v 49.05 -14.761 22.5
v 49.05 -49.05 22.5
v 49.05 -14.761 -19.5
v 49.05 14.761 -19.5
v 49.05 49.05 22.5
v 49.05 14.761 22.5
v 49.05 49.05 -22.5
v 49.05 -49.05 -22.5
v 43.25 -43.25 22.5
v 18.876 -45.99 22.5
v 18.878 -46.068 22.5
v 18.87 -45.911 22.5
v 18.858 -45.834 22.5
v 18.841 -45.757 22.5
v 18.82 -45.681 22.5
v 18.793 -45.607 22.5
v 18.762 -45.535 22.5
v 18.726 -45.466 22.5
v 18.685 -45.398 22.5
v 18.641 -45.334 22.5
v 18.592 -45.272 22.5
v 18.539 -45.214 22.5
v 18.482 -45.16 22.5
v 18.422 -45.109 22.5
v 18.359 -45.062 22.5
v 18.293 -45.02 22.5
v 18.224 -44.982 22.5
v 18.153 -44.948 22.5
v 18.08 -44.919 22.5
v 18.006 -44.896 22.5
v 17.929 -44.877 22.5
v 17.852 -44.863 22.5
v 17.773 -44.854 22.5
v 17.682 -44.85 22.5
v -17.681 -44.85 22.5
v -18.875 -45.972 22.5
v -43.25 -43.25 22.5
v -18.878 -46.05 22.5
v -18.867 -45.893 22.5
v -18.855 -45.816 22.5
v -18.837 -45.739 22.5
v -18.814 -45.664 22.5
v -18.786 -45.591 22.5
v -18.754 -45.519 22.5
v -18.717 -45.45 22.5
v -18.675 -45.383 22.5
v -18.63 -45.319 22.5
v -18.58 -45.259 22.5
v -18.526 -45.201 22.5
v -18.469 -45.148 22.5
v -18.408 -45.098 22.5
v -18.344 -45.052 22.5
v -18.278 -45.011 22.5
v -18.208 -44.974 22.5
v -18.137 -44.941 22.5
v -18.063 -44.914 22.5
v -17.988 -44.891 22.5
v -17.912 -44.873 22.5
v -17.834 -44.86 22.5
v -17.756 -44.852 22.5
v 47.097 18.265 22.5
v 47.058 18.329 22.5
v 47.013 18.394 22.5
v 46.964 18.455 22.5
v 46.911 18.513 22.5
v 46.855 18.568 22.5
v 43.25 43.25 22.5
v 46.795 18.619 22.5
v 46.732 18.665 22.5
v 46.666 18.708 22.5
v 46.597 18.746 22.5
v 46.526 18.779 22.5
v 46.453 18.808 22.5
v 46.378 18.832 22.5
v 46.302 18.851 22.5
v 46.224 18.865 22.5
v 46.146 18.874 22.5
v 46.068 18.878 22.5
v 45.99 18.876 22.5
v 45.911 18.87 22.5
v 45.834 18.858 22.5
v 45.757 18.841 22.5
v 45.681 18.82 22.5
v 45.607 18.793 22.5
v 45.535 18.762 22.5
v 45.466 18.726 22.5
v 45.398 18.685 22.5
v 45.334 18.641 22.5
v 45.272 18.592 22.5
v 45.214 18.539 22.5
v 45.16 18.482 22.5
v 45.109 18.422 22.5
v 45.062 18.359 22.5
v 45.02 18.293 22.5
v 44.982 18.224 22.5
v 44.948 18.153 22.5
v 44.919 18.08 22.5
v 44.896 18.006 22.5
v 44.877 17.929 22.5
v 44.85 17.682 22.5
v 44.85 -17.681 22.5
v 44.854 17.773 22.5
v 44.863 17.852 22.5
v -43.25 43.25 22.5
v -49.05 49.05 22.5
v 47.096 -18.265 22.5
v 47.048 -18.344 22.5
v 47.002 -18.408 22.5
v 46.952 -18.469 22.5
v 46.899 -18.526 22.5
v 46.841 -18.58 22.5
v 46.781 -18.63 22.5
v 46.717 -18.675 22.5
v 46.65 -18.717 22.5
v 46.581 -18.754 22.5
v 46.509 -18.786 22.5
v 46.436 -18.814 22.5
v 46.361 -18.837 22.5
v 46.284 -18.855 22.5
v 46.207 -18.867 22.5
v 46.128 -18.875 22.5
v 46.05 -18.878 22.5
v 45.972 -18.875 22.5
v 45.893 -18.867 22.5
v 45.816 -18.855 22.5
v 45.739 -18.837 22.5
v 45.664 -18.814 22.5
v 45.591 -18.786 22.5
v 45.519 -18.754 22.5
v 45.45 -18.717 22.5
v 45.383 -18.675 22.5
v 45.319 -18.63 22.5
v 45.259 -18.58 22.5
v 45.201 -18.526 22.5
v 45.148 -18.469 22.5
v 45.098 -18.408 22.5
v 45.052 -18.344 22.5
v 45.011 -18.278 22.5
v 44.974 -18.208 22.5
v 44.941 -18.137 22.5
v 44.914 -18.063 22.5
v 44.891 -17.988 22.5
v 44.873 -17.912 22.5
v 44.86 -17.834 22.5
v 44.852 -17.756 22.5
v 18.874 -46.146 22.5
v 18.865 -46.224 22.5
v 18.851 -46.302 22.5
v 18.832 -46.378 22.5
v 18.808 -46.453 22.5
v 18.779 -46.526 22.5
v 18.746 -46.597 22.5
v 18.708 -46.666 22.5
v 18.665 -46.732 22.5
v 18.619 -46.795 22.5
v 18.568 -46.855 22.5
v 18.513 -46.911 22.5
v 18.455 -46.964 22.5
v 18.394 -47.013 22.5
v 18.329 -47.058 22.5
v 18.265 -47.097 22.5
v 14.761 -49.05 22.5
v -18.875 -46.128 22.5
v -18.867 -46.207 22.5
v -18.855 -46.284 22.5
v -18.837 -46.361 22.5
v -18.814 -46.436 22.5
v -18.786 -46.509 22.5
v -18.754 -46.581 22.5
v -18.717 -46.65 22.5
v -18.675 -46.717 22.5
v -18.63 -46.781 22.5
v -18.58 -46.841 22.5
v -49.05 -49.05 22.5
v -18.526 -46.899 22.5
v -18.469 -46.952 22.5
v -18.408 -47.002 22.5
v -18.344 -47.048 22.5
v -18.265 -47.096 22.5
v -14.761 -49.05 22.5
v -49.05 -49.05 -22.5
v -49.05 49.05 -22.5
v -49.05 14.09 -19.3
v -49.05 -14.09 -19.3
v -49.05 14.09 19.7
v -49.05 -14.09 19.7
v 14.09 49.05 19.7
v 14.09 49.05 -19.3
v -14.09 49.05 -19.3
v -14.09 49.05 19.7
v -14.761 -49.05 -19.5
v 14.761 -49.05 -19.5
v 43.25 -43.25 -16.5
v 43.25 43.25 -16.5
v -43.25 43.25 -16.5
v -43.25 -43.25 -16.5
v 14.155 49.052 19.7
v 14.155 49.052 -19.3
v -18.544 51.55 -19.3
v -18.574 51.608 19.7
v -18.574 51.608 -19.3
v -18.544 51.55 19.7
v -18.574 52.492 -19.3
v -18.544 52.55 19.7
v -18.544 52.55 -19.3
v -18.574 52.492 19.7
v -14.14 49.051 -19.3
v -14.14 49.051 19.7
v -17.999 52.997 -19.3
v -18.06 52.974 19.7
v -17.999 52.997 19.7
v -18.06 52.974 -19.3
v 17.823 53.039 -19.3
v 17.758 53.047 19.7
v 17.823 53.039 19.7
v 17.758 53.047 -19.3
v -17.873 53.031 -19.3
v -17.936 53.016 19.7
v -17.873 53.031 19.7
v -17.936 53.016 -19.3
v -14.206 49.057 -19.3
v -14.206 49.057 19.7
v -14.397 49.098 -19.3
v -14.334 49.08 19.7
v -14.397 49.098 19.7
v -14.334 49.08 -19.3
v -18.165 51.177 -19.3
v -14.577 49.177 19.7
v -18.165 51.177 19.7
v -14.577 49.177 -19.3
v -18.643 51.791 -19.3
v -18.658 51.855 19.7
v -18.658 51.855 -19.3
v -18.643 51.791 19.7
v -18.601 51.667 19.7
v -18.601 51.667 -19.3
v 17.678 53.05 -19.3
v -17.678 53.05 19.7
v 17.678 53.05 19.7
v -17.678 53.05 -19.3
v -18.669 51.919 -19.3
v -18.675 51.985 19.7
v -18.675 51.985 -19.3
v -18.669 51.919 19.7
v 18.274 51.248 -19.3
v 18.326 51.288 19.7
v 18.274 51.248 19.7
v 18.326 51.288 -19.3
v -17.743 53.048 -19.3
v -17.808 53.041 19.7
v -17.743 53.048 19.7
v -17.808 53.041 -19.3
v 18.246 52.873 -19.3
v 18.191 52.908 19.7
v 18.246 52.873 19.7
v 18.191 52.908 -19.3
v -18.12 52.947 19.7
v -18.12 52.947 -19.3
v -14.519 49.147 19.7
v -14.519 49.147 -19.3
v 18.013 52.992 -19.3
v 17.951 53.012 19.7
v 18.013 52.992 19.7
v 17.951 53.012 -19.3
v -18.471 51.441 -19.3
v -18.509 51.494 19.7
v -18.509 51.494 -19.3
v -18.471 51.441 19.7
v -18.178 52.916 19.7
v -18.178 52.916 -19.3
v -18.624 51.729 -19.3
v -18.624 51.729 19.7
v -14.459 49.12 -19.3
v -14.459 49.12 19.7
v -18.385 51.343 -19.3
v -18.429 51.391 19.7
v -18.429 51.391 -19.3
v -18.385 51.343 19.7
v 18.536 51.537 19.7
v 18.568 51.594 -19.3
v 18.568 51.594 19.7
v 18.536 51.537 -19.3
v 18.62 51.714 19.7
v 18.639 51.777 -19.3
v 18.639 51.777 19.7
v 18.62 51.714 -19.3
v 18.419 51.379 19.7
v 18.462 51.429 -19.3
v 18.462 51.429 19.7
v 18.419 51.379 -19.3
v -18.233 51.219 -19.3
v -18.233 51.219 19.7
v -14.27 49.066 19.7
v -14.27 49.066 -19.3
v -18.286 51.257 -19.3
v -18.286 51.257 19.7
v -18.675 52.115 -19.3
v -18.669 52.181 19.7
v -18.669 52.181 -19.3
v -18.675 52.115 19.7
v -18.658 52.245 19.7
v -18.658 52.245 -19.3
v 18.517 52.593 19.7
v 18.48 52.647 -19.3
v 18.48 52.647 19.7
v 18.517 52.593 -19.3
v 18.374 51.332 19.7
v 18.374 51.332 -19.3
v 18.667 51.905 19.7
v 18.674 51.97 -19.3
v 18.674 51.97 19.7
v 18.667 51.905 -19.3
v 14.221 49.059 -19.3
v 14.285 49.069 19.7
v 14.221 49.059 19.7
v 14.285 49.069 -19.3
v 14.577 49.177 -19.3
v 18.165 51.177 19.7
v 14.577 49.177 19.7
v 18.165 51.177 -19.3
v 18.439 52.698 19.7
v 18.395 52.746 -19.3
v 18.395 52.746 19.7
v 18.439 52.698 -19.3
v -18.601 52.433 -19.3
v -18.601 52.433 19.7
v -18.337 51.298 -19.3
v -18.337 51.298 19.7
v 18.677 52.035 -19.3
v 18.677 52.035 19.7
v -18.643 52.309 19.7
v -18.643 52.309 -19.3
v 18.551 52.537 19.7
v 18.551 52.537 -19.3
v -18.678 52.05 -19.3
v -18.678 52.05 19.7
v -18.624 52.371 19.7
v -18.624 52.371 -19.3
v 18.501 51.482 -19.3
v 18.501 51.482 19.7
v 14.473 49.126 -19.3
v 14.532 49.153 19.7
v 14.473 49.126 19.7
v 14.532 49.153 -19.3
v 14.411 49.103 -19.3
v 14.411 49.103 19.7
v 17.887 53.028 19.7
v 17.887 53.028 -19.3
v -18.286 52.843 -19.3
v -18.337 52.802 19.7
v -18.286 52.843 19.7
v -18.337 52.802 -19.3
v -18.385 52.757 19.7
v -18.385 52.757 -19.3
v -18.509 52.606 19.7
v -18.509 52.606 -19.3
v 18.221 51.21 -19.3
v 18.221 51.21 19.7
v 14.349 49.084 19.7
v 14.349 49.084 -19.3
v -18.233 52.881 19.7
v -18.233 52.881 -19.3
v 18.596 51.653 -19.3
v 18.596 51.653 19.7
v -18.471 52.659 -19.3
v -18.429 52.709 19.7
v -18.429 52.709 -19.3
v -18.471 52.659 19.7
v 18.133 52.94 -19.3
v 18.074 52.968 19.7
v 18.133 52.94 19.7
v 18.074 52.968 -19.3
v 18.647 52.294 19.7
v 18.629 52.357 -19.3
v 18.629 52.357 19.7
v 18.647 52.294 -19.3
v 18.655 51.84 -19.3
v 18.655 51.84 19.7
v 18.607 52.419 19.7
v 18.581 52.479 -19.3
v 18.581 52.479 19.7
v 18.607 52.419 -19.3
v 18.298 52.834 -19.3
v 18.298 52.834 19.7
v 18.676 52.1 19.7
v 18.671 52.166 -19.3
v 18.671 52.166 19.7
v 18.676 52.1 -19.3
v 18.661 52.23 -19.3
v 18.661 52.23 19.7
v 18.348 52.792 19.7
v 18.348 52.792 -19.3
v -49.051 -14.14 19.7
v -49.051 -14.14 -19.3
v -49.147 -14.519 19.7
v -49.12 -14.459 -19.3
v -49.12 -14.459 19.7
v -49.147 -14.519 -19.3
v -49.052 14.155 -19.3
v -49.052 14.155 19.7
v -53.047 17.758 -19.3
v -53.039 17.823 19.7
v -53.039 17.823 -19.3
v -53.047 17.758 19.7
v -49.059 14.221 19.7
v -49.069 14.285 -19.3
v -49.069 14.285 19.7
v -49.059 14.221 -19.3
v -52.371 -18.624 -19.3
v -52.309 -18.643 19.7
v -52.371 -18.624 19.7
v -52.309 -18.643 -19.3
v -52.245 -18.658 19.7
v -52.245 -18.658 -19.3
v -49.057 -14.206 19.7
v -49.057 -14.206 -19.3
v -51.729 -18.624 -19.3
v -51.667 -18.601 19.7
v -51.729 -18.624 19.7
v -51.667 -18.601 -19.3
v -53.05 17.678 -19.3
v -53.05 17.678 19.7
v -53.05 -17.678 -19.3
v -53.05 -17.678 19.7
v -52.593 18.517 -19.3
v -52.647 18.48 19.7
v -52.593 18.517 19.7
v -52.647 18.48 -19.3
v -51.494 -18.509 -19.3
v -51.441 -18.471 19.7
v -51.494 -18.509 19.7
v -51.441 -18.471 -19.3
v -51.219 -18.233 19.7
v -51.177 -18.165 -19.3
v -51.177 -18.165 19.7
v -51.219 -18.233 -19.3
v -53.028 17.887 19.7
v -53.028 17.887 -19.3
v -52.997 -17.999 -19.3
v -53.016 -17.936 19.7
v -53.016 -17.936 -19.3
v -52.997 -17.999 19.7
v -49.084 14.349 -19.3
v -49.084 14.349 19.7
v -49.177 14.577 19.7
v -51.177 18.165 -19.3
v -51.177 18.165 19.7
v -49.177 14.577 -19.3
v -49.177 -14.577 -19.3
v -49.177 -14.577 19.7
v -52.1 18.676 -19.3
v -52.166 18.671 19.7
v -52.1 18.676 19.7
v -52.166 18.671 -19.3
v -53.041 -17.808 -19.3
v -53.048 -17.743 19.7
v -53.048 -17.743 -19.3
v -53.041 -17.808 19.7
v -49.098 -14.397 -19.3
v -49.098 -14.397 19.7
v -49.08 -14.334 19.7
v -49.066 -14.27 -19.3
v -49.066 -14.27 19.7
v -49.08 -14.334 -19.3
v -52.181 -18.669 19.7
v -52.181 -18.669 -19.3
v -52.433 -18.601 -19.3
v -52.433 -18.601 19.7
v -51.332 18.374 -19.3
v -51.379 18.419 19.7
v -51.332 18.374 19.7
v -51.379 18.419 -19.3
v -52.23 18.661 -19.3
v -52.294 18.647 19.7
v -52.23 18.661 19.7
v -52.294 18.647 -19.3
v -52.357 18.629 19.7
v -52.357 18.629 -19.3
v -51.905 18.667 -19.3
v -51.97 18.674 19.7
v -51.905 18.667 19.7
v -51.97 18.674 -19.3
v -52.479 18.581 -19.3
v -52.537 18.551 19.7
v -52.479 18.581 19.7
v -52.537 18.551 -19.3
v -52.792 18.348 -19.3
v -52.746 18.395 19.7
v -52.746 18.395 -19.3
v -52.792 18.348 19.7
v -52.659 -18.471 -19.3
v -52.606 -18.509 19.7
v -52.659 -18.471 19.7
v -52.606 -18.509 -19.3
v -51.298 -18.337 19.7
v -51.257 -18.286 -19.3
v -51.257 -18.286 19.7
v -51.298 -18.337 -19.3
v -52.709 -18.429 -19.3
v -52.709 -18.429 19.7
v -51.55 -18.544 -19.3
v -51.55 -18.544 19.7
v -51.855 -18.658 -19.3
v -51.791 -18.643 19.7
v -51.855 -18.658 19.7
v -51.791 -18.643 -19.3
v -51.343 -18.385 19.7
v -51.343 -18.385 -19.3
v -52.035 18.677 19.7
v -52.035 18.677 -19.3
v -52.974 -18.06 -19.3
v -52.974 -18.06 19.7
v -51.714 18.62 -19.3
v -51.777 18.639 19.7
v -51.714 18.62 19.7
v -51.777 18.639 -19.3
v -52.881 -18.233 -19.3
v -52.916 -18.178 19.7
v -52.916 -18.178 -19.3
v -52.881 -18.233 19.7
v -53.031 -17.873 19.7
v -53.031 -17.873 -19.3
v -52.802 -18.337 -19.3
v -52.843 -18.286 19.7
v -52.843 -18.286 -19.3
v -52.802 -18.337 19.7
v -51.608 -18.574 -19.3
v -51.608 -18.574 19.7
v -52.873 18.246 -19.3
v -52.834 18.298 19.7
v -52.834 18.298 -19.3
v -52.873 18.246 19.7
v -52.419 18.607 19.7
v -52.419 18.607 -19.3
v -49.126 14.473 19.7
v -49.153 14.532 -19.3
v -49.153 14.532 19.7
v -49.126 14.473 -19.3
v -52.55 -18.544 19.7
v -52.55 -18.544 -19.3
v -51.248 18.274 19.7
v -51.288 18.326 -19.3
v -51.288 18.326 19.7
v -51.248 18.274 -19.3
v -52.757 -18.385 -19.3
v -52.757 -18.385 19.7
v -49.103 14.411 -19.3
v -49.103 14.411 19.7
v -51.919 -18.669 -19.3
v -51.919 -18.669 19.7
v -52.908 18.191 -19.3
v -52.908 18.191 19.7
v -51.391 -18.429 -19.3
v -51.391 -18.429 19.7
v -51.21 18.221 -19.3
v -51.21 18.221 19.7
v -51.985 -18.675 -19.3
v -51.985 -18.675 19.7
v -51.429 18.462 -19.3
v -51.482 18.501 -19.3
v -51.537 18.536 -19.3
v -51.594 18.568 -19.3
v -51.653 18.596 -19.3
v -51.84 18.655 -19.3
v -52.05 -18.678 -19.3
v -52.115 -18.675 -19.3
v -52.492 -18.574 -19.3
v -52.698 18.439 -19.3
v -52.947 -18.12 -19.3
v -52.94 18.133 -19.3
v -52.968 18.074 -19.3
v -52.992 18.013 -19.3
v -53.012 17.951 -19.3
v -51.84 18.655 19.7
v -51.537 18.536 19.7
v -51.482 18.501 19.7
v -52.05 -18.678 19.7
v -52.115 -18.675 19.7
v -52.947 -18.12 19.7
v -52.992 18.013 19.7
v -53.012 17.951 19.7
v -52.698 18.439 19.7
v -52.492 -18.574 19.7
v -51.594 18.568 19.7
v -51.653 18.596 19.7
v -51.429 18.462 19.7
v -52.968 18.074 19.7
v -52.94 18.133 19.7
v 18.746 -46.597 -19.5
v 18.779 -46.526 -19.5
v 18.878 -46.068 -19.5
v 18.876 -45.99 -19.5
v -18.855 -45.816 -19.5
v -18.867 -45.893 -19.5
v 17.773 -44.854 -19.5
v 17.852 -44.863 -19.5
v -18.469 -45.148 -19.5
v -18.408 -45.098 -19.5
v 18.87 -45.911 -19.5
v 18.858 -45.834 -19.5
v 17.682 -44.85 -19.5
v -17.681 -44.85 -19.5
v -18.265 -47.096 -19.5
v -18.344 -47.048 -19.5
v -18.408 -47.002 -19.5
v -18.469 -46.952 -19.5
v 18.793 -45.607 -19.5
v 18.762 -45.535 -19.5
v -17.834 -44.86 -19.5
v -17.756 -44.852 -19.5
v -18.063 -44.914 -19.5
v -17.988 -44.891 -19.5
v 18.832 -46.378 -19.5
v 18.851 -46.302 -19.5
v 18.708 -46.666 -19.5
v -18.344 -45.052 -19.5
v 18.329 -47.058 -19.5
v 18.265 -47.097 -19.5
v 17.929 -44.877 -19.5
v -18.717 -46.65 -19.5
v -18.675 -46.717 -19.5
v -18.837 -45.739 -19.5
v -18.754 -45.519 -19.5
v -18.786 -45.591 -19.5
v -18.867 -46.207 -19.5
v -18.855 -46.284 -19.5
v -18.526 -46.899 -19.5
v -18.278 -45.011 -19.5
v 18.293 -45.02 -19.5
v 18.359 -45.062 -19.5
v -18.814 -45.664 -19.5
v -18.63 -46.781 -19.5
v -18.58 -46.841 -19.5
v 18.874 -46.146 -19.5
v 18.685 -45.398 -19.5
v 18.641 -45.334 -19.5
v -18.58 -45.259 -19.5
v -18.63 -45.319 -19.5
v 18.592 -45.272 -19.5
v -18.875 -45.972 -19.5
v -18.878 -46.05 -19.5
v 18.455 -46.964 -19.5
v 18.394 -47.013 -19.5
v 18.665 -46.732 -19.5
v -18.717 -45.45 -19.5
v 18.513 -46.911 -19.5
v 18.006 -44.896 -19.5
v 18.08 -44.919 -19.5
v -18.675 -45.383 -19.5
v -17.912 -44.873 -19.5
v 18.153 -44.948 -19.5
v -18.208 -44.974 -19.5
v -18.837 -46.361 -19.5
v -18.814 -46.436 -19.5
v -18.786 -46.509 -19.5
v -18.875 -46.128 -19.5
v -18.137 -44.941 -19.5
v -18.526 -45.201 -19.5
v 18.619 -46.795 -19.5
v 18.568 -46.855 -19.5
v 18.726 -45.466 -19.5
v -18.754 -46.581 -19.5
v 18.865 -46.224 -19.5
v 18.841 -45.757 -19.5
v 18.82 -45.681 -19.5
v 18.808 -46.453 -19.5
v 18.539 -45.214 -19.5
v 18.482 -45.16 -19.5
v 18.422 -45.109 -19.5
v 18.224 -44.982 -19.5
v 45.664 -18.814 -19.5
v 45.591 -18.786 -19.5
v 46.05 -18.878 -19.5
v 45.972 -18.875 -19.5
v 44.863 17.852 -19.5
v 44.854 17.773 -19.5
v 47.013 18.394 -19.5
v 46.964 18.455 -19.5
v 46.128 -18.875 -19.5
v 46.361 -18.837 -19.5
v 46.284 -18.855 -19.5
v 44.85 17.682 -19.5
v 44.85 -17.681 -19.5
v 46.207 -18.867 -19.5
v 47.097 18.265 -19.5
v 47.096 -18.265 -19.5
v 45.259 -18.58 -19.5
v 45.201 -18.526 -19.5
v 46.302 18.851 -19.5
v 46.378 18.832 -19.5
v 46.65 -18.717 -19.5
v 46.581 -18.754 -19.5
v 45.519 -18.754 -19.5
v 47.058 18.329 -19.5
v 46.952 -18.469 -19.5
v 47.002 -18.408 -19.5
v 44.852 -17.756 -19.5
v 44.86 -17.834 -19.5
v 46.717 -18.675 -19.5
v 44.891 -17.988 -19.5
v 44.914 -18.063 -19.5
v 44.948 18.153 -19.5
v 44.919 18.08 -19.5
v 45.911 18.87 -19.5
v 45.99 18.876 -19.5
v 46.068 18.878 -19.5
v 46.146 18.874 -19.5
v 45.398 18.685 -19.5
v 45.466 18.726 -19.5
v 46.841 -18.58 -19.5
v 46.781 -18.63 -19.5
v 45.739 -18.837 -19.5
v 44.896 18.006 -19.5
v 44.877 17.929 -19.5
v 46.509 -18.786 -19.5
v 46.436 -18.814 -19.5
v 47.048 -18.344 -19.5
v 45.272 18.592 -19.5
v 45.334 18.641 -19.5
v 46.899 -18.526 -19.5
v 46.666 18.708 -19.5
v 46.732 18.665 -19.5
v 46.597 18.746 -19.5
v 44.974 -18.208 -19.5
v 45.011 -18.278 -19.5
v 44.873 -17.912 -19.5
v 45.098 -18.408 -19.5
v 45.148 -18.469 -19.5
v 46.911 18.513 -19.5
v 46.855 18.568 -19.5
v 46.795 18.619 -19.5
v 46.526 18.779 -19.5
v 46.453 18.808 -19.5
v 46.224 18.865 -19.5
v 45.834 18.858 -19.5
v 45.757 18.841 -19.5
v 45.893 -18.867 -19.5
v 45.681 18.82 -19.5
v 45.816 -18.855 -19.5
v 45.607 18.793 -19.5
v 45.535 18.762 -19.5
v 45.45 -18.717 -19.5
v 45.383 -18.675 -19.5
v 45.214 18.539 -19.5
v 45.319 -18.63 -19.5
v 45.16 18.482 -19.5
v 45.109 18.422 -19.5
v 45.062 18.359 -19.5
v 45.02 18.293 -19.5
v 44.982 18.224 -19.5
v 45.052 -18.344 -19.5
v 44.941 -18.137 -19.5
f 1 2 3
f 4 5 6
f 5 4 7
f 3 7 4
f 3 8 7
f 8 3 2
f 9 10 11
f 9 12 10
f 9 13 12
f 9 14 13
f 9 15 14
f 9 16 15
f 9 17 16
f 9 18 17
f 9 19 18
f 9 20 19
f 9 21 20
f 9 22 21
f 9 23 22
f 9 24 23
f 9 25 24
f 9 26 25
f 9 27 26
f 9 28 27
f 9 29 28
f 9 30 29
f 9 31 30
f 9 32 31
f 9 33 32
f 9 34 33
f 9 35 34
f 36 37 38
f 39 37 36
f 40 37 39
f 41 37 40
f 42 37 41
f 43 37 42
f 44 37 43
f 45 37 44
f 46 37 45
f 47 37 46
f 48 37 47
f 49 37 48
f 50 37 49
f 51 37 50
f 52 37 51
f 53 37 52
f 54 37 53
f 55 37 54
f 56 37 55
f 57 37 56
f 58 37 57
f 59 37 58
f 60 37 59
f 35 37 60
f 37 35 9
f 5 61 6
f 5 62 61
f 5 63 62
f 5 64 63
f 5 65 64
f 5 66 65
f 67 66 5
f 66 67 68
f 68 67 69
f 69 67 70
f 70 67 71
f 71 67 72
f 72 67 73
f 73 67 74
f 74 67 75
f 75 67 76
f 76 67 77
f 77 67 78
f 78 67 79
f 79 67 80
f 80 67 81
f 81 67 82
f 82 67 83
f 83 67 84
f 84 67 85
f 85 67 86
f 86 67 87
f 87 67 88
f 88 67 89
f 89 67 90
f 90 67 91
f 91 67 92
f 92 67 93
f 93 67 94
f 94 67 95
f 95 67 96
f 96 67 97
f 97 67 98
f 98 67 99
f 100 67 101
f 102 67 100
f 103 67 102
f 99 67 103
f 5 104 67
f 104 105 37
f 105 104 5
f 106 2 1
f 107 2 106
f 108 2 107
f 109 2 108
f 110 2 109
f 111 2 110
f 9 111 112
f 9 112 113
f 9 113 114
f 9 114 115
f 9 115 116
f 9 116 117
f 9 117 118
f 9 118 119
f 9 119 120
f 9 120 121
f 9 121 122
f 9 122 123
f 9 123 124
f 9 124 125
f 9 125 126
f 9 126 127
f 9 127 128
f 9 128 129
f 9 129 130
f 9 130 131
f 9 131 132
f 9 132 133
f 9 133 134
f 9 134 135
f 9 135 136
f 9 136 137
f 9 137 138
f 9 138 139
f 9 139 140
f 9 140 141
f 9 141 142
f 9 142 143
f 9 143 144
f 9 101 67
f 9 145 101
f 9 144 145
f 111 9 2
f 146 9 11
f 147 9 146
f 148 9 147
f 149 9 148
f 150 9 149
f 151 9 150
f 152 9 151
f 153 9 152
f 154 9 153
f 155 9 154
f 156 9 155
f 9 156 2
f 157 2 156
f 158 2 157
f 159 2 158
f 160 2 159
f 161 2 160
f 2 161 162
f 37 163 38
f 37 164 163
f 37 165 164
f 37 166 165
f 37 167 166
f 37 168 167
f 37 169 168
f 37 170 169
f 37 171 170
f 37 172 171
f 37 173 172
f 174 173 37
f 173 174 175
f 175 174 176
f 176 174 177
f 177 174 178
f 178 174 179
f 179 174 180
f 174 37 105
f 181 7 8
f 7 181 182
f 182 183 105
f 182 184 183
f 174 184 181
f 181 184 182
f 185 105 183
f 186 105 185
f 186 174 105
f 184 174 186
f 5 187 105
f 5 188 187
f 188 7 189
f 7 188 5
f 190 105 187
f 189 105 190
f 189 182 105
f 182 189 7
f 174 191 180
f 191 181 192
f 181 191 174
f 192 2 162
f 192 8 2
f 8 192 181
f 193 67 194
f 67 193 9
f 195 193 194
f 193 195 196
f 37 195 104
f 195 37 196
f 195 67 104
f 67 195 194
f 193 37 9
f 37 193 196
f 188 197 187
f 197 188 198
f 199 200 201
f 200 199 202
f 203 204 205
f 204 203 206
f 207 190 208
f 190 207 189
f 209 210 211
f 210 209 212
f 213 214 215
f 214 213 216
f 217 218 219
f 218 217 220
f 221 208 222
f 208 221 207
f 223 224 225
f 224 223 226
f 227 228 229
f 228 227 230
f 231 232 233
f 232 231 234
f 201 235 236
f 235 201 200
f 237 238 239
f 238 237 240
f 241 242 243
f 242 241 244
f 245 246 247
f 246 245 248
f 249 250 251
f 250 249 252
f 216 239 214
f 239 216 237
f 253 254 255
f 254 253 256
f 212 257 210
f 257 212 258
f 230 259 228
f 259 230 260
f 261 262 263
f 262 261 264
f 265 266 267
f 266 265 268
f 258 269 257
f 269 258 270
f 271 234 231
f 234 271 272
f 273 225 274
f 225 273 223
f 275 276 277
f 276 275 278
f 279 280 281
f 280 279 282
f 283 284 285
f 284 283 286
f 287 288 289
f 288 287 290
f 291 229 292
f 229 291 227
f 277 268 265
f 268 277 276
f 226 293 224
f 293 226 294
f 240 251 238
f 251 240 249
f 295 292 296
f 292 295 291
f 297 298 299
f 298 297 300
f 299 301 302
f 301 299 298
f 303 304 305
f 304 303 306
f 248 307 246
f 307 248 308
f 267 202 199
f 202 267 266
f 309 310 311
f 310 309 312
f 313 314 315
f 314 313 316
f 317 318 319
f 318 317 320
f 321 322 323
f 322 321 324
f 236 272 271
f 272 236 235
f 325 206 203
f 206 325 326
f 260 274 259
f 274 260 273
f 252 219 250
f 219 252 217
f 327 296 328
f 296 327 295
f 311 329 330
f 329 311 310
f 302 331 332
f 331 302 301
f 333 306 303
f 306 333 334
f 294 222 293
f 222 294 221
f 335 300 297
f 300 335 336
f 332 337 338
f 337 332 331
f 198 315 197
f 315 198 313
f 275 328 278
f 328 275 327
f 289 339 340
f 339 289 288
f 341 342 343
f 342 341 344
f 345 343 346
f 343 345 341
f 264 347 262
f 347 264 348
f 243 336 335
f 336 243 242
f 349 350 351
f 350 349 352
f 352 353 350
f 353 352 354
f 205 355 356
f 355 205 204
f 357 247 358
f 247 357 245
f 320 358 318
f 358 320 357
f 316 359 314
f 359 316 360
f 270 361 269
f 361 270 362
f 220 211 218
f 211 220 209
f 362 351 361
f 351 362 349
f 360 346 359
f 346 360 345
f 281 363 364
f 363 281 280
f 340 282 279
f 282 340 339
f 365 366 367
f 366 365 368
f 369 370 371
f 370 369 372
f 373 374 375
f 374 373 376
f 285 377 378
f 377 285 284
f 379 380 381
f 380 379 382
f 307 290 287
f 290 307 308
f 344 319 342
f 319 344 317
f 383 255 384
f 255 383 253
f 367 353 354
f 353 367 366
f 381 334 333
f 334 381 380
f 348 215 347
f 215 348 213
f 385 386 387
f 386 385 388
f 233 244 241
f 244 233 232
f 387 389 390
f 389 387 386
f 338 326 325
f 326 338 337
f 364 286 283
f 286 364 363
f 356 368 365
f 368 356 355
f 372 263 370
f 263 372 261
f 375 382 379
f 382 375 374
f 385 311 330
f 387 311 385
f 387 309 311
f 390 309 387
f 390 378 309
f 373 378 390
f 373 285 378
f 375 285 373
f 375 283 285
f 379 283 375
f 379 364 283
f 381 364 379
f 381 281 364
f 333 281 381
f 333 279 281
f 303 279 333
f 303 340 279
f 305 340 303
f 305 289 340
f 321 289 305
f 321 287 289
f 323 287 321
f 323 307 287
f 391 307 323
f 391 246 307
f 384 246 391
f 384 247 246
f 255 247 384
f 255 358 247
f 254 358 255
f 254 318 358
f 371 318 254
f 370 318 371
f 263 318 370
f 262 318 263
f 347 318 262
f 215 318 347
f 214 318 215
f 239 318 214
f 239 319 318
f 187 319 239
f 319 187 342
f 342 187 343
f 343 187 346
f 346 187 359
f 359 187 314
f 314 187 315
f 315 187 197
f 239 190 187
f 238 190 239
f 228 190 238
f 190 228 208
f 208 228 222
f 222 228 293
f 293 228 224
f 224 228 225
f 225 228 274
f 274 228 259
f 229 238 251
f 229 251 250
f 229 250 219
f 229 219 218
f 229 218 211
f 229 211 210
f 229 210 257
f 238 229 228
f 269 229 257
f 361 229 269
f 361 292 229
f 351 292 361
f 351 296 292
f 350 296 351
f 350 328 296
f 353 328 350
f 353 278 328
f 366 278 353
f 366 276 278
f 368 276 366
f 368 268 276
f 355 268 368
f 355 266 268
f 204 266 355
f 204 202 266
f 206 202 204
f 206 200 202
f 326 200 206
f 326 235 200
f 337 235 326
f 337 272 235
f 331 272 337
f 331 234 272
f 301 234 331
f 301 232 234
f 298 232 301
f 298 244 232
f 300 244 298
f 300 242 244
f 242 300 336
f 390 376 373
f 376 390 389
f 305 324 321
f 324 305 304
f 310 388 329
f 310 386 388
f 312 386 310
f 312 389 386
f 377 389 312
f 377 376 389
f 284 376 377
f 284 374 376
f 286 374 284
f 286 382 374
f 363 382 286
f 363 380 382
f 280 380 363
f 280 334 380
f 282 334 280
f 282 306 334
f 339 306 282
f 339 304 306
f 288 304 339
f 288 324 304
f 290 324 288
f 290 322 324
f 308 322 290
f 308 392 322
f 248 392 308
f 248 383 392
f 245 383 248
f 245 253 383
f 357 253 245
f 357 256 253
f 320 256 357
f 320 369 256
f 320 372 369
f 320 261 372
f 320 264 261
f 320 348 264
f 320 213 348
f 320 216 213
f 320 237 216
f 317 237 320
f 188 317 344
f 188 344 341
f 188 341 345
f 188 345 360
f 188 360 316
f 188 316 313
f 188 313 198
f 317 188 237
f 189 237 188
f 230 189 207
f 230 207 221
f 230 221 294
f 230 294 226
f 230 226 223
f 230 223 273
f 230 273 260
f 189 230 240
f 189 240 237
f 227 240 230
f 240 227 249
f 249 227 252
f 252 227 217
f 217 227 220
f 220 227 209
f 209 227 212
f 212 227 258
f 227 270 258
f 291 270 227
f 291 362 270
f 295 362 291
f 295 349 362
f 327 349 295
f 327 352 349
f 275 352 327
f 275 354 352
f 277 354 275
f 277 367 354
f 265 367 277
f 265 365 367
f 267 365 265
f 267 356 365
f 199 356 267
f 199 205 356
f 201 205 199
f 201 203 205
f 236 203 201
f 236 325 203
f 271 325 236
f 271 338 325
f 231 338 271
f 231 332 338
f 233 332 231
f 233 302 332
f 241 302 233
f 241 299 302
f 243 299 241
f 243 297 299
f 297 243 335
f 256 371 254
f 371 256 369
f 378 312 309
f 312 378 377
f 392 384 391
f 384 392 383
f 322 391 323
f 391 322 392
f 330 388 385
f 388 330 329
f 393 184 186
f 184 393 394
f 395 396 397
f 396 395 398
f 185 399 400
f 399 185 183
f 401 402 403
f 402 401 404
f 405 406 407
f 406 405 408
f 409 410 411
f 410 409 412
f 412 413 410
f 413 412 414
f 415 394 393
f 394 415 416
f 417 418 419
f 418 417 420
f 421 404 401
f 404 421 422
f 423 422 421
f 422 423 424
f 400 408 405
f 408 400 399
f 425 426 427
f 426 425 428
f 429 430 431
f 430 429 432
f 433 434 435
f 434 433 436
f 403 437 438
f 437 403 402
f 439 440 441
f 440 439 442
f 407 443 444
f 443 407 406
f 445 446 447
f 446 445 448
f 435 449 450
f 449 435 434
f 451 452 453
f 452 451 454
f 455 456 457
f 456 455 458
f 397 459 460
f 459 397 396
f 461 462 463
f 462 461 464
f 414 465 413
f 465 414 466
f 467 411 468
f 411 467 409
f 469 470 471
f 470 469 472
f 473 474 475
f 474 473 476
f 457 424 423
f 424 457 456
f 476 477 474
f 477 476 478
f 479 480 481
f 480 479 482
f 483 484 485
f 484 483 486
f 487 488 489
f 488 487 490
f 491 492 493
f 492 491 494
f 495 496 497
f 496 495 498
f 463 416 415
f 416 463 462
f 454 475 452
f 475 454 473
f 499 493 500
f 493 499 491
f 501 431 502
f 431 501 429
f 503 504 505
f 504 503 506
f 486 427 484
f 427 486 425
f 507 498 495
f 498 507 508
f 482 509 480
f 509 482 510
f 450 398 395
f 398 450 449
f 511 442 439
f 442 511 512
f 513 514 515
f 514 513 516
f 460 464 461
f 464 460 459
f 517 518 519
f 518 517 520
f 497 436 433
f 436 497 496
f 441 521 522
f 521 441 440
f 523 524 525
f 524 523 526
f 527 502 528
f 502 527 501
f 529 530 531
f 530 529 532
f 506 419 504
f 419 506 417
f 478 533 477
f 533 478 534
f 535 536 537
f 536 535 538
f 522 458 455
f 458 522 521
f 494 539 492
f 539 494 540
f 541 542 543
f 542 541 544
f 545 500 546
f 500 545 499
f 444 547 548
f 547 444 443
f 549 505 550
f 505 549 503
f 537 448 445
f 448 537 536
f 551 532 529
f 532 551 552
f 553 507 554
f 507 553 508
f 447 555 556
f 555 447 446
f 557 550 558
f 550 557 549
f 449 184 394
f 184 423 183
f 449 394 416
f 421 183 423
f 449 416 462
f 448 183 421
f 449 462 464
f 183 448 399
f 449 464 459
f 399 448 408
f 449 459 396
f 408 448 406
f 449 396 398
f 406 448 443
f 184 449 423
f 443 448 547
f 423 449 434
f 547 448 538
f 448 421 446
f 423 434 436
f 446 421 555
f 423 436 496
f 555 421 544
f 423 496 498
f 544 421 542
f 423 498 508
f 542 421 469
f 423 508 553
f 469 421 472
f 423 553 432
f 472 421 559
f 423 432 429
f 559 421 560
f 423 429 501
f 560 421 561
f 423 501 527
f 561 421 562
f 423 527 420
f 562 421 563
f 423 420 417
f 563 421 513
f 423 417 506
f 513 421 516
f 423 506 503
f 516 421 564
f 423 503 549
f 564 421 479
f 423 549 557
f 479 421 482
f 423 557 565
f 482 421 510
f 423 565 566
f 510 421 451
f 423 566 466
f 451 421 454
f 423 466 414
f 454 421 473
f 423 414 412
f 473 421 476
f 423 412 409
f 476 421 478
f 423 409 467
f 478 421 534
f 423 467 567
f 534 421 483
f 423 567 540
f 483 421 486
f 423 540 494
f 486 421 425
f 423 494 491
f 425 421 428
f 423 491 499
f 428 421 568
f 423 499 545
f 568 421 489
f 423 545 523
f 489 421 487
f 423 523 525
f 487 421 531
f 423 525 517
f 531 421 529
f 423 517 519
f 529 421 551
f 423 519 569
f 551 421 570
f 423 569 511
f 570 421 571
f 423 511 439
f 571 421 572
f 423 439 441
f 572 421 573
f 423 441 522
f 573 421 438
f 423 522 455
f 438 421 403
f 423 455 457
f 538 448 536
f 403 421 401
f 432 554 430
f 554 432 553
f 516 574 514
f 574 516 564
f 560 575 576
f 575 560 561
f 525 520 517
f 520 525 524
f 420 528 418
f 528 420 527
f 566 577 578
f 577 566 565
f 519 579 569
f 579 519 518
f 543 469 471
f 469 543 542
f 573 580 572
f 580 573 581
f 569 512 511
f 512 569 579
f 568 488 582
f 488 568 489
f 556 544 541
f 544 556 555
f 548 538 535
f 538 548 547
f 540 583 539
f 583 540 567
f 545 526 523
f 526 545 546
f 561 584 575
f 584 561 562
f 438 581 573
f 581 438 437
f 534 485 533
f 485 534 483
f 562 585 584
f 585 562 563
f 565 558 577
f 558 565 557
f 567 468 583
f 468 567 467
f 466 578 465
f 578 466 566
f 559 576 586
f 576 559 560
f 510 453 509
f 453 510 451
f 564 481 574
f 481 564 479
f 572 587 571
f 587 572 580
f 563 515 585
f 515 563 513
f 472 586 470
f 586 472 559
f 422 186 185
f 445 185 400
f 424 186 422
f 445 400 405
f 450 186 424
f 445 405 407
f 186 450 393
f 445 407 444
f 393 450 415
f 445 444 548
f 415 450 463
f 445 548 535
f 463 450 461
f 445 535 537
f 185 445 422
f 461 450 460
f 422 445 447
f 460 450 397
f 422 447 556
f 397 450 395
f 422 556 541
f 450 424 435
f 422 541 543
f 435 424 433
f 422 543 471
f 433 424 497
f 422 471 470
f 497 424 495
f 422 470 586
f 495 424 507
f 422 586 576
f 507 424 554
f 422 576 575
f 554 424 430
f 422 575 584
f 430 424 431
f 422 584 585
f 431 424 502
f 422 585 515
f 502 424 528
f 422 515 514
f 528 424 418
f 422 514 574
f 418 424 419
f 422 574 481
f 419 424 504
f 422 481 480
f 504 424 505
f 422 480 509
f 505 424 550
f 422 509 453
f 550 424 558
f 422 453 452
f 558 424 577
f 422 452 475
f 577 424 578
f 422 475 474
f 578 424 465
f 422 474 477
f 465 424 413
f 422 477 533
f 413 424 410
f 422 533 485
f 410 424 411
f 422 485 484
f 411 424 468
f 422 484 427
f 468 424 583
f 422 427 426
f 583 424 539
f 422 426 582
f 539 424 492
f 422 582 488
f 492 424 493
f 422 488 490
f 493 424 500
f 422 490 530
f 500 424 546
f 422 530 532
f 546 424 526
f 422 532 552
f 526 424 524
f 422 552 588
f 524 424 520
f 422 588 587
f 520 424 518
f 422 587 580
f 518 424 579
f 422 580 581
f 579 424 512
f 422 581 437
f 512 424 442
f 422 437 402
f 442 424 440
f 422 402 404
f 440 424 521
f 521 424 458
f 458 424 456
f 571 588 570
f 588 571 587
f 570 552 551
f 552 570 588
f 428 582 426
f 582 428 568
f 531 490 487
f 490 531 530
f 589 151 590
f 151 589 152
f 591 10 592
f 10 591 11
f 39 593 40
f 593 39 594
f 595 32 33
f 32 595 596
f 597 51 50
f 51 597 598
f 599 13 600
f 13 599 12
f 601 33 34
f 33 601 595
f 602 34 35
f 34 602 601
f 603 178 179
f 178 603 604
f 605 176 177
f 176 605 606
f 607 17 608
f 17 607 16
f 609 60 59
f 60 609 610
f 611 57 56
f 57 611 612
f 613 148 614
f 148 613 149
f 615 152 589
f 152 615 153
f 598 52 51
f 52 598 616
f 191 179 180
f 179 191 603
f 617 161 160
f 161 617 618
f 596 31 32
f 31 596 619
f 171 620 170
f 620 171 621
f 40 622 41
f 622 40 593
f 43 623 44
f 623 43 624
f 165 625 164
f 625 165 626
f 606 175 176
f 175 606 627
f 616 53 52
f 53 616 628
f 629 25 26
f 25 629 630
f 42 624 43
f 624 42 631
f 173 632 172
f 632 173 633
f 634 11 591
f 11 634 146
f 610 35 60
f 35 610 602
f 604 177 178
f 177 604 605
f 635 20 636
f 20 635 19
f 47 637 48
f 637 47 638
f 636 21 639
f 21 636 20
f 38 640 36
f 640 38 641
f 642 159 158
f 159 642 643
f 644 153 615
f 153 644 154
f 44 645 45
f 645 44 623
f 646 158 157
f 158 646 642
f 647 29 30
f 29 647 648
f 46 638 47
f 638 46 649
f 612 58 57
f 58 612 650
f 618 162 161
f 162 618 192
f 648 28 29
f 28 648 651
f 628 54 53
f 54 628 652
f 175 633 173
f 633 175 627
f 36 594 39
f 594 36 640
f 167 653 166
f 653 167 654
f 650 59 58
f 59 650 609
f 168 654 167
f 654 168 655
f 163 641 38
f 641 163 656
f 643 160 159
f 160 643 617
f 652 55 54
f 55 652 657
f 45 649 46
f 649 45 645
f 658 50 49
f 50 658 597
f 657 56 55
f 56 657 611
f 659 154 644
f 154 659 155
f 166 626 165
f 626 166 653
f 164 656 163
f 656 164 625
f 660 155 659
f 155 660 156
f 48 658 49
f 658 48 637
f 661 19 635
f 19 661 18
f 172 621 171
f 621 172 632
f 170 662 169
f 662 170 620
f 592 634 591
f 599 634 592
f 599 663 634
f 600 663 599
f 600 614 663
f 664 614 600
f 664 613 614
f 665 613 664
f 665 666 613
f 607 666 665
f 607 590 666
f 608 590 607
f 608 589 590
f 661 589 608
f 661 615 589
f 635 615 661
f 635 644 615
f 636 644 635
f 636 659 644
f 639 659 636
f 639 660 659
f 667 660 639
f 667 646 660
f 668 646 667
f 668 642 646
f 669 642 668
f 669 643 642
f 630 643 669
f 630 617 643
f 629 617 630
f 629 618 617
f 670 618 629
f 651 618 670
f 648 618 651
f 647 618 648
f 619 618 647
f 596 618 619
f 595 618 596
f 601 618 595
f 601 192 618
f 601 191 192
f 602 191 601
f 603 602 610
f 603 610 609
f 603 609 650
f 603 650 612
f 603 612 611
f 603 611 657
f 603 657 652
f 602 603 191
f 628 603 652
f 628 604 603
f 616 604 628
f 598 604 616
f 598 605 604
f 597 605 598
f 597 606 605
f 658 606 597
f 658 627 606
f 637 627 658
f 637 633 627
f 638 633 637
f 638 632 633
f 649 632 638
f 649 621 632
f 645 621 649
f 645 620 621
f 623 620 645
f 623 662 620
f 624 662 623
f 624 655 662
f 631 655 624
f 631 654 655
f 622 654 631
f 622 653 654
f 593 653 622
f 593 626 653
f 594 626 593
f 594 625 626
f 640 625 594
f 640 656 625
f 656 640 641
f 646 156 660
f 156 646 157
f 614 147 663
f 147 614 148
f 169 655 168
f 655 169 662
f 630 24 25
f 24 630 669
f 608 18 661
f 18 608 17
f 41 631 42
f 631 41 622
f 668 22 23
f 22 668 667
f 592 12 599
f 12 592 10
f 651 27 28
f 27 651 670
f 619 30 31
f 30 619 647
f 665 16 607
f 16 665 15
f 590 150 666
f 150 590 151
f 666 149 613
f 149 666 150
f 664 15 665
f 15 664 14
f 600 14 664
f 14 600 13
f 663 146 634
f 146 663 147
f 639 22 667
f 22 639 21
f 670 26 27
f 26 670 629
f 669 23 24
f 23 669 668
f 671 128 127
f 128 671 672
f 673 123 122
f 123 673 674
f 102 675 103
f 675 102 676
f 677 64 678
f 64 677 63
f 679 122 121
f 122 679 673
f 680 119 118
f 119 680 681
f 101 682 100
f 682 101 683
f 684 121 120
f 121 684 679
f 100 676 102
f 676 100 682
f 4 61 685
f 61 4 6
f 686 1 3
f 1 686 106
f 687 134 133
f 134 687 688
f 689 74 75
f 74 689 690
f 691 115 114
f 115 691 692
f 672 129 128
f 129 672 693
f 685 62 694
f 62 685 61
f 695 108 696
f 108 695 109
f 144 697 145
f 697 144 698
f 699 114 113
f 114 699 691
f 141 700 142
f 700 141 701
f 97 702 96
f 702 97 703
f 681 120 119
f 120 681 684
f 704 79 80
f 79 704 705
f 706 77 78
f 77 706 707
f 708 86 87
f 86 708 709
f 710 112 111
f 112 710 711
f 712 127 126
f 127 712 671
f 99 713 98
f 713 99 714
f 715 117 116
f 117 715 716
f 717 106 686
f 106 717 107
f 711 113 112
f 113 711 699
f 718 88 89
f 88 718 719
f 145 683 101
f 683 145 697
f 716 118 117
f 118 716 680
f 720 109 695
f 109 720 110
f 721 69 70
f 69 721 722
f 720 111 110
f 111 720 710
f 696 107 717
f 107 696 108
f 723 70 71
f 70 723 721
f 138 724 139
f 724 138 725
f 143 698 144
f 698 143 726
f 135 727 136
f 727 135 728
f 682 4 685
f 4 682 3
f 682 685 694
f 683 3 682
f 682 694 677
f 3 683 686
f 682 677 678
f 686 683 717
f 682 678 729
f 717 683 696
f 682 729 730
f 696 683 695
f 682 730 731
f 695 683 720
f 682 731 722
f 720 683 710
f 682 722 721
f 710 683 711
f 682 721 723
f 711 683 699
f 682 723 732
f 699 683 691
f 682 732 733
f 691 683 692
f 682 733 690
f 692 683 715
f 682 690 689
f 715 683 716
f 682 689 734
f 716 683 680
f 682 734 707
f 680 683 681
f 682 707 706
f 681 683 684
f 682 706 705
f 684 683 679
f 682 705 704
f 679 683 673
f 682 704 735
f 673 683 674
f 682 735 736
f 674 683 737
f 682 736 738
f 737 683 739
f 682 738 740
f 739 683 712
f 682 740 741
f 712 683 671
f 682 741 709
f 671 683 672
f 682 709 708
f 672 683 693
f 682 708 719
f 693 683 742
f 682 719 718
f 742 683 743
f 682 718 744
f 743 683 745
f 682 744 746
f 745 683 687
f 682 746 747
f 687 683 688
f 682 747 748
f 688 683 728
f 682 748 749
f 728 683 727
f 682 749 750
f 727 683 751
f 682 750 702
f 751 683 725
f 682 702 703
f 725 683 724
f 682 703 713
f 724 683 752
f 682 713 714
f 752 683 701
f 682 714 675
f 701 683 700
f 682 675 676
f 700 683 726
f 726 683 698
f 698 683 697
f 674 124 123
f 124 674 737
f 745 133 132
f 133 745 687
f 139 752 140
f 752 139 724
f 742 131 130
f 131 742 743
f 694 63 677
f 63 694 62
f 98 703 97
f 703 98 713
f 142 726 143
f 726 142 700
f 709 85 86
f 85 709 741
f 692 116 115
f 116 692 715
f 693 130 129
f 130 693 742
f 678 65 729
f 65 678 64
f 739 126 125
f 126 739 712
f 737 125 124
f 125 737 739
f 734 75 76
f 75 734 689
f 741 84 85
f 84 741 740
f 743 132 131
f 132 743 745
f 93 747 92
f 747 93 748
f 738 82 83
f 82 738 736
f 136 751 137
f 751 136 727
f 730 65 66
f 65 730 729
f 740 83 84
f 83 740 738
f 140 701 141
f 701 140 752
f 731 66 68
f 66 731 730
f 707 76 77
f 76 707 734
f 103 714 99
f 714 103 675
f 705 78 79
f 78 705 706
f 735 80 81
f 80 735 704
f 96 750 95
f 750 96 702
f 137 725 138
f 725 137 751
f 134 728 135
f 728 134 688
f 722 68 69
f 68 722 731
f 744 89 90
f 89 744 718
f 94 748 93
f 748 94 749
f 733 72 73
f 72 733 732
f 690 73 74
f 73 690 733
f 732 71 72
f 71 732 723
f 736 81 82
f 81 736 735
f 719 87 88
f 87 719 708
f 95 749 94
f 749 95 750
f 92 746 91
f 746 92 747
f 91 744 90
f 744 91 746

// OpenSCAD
// file: utils/dovetail.scad
/**
 * @file dovetail.scad
 * @brief Dovetail cross section and prism, for keying parts together
 * @author Cameron K. Brooks
 * @copyright 2026
 * @description A dovetail is a trapezium stood on its narrow end: the root is narrow and the
 * crown splays out, so a tail slid into a matching socket cannot be pulled straight out. The
 * corners are swept into arcs rather than left as sharp points.
 *
 * The socket is the same profile grown by an allowance, so the tail and socket cannot drift
 * apart.
 *
 * The flare is set by root_width. Its default of two thirds of the crown gives a steep flare
 * (~52 degrees off vertical at the bottle holder's proportions) suited to a coarse stacking key;
 * a joint wanting the usual 7-15 degrees needs a root much closer to the crown width.
 */

/**
 * @brief Points of a dovetail cross section, counter-clockwise from the root.
 * @param width      Width across the crown (the widest part)
 * @param height     Root-to-crown height
 * @param root_width Width across the root; defaults to two thirds of the crown
 */
function dovetail_pts(width, height, root_width = undef) =
  let (root = is_undef(root_width) ? width * 2 / 3 : root_width) [
      [-root / 2, 0], // root left
      [root / 2, 0], // root right
      [width / 2, height], // crown right
      [-width / 2, height], // crown left
  ];

/**
 * @brief A dovetail prism, extruded along z from the origin.
 * @param length       Extrusion length
 * @param allowance    Grows the profile all round; 0 for the tail, the fit clearance for the socket
 * @param crown_radius Corner arc radius; defaults to height/4
 */
module dovetail(width, height, length, allowance = 0, root_width = undef, crown_radius = undef) {
  r = is_undef(crown_radius) ? height / 4 : crown_radius;

  linear_extrude(height=length)
    offset(delta=allowance)
      // shrink then grow: every sharp corner comes back as an arc tangent to both edges
      offset(r=r) offset(r=-r)
        polygon(dovetail_pts(width, height, root_width));
}
// main file
/**
 * @file bottle_holder.scad
 * @brief Stackable holder sleeve for media bottles
 * @author Cameron K. Brooks
 * @copyright 2026
 *
 * The sleeve is square, so it takes either a cylindrical or a square bottle of the given
 * diameter. sleeve_ratio sets how far up the bottle the sleeve reaches. Two pairs of
 * male-female dovetails on opposing faces let holders be stacked into a grid.
 */

use <utils/dovetail.scad>;

$fn = $preview ? 48 : 96;
z_fight = $preview ? 0.05 : 0.0;

bottle_diameter = 86.1; // square bottle is 62.6mm, round bottle is 86.1
bottle_height = 130;

sleeve_ratio = 0.3;
wall_thickness = 6;
allowance = 0.2;

module dummy() {
  // stop the customizer detection from here onwards
}

// Derived

sleeve_height = bottle_height * sleeve_ratio;
outer_width = bottle_diameter + wall_thickness * 2;

dovetail_height = wall_thickness * 2 / 3;
dovetail_width = bottle_diameter / 2;

difference() {

  union() {
    // sleeve
    difference() {
      cube([outer_width, outer_width, sleeve_height + wall_thickness], center=true);
      translate([0, 0, wall_thickness / 2])
        cube([bottle_diameter + allowance * 2, bottle_diameter + allowance * 2, sleeve_height + z_fight], center=true);
    }

    // tails, on the +x and +y faces
    for (i = [0, 1])
      rotate([0, 0, i * 90])
        translate([0, outer_width / 2, -sleeve_height / 2 + allowance])
          dovetail(dovetail_width, dovetail_height, sleeve_height);
  }

  // sockets, on the -x and -y faces; grown by the allowance so a tail slides in
  for (i = [0, 1])
    rotate([0, 0, i * 90])
      translate([0, -outer_width / 2, -sleeve_height / 2])
        dovetail(dovetail_width, dovetail_height, sleeve_height * 2, allowance=allowance);
}
